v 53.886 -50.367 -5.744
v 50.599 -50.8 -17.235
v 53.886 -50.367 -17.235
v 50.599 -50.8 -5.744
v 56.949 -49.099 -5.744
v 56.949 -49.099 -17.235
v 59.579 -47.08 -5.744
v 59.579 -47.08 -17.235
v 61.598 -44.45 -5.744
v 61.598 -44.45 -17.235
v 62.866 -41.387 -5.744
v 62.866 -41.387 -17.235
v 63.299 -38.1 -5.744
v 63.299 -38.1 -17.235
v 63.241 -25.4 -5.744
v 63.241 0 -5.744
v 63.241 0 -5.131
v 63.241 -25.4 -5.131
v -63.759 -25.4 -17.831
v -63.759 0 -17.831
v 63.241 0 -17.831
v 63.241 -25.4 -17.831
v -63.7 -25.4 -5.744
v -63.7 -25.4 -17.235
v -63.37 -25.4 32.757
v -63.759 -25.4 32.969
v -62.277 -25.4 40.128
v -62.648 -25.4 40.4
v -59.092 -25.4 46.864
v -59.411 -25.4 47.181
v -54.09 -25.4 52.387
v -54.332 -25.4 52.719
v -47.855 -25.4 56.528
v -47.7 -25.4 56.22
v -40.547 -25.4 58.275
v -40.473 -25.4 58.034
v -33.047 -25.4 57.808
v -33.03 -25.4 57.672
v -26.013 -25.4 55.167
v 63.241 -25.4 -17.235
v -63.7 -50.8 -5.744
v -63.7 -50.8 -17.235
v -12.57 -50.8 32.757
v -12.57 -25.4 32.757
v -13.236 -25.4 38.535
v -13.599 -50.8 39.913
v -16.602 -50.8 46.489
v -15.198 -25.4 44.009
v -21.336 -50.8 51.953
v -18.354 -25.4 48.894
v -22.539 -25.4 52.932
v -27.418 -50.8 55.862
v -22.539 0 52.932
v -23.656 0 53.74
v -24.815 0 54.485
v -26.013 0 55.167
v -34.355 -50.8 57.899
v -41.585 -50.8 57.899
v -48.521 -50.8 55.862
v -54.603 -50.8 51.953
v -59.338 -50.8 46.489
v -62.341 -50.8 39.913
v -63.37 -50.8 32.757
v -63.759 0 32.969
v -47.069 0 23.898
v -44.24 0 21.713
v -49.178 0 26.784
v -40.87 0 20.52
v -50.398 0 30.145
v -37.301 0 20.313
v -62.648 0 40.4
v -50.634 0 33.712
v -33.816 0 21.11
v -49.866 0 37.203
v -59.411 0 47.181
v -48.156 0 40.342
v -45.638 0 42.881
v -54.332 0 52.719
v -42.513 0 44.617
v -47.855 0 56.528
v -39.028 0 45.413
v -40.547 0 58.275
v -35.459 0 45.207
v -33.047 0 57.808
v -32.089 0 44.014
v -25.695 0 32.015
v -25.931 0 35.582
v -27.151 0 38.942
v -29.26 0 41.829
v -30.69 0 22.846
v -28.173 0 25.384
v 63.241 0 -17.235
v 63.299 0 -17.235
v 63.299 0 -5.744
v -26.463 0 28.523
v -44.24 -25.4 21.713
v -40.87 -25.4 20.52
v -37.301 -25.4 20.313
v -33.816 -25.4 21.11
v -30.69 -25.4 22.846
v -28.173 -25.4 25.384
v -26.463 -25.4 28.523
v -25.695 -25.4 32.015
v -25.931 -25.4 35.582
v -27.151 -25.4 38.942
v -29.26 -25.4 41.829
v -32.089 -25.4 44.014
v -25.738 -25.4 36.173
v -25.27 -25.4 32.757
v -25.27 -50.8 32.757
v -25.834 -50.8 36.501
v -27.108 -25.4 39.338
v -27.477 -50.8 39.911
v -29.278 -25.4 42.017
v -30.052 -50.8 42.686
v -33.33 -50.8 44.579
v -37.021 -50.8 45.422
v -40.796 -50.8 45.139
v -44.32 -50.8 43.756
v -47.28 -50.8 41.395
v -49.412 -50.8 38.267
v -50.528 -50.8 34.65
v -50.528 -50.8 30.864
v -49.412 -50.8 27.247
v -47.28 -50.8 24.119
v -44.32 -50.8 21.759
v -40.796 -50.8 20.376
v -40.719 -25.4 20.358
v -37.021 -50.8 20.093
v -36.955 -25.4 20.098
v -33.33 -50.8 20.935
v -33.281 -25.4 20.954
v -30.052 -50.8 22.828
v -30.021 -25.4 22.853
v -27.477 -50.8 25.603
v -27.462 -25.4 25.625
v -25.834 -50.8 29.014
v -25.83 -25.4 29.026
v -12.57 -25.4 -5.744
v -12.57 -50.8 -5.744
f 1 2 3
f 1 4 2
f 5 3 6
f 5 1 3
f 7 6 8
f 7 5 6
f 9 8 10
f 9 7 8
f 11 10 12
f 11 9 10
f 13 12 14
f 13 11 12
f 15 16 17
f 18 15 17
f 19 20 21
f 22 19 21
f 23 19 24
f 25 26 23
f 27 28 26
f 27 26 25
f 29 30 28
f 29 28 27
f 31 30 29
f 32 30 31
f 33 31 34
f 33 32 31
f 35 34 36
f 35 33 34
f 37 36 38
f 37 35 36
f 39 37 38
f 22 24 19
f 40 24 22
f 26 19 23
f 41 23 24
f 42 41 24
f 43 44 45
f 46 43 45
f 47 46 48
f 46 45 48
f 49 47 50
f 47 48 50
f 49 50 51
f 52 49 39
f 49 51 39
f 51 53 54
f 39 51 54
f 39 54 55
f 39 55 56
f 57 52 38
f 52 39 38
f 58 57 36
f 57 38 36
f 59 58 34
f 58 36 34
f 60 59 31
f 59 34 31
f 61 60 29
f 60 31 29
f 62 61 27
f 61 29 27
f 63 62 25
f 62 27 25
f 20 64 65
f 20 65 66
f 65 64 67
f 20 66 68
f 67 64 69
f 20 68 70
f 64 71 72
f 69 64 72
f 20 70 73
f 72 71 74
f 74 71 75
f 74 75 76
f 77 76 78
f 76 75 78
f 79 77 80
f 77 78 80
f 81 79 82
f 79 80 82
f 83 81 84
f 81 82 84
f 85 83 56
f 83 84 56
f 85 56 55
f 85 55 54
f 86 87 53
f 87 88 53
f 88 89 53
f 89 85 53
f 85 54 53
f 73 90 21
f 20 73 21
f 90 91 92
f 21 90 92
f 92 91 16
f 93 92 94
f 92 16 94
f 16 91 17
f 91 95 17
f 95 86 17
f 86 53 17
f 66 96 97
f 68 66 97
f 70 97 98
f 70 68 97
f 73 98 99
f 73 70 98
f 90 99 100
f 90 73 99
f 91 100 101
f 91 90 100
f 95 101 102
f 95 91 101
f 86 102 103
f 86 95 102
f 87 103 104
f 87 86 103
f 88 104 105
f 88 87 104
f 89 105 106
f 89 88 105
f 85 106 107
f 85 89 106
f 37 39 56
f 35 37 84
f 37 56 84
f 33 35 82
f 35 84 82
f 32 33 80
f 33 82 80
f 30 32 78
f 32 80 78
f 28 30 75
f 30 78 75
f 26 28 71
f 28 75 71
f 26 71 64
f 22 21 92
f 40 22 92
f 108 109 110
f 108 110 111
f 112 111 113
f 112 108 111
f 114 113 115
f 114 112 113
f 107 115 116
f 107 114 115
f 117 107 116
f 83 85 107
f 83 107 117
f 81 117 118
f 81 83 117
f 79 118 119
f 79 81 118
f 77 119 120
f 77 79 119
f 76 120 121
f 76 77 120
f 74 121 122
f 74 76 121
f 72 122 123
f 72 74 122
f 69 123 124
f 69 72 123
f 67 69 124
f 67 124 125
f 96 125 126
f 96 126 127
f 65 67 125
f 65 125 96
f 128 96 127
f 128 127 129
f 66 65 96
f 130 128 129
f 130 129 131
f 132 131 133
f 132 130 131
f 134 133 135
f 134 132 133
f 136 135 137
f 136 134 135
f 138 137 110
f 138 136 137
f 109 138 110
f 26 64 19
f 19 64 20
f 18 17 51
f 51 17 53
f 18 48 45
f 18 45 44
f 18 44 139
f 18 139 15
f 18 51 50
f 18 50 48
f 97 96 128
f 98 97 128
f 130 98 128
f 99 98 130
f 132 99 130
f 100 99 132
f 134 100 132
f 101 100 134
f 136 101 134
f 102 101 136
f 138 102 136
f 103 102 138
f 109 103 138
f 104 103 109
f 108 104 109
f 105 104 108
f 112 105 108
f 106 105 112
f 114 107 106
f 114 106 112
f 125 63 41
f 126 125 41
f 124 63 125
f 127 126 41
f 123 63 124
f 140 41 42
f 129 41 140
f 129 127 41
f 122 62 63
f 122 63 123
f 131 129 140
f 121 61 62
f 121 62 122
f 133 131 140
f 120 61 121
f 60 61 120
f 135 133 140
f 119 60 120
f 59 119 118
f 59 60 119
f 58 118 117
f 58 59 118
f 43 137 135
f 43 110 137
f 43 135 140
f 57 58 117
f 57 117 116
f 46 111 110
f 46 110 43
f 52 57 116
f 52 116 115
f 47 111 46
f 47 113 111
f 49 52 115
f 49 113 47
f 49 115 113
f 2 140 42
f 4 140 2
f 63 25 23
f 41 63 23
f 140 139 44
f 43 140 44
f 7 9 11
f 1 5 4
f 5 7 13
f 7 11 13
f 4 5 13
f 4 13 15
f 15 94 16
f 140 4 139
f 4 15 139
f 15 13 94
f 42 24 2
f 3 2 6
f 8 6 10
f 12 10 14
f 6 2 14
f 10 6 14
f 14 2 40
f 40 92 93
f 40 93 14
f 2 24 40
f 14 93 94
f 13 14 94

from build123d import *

# Parameters (mm, degrees)
F0_R     = 12.7
F1_DEPTH = 25.4
F2_R     = 12.7
F3_DEPTH = 50.8
F4_R     = 12.7


with BuildPart() as f1:
    # F0 (on Front) → F1 (new body)
    with BuildSketch(Plane.XZ):
        with BuildLine():
            Line((63.240985, -5.1308), (-24.121142, 54.003528))
            ThreePointArc((-24.121142, 54.003528), (-50.265274, 55.405799), (-63.759015, 32.9692))
            Line((-63.759015, 32.9692), (-63.759015, -17.8308))
            Line((-63.759015, -17.8308), (63.240985, -17.8308))
            Line((63.240985, -17.8308), (63.240985, -5.1308))
        make_face()
        with Locations((-38.359015, 32.9692)):
            Circle(F0_R, mode=Mode.SUBTRACT)
    extrude(amount=F1_DEPTH)

    # F2 (on Front) → F3 (join)
    with BuildSketch(Plane.XZ):
        with BuildLine():
            Line((-12.569834, -5.744165), (-12.569834, 32.757161))
            ThreePointArc((-12.569834, 32.757161), (-37.969834, 58.157161), (-63.369834, 32.757161))
            Line((-63.369834, 32.757161), (-63.700385, -5.744165))
            Line((-63.700385, -5.744165), (-63.700385, -17.234586))
            Line((-63.700385, -17.234586), (63.299008, -17.234586))
            Line((63.299008, -17.234586), (63.299008, -5.744165))
            Line((63.299008, -5.744165), (-12.569834, -5.744165))
        make_face()
        with Locations((-37.969834, 32.757161)):
            Circle(F2_R, mode=Mode.SUBTRACT)
    extrude(amount=F3_DEPTH)

    # F4
    f4_edges = [f1.edges().sort_by_distance(p)[0] for p in [
        (63.299008, -50.8, -11.489375),
    ]]
    fillet(f4_edges, radius=F4_R)


solid = f1.part
